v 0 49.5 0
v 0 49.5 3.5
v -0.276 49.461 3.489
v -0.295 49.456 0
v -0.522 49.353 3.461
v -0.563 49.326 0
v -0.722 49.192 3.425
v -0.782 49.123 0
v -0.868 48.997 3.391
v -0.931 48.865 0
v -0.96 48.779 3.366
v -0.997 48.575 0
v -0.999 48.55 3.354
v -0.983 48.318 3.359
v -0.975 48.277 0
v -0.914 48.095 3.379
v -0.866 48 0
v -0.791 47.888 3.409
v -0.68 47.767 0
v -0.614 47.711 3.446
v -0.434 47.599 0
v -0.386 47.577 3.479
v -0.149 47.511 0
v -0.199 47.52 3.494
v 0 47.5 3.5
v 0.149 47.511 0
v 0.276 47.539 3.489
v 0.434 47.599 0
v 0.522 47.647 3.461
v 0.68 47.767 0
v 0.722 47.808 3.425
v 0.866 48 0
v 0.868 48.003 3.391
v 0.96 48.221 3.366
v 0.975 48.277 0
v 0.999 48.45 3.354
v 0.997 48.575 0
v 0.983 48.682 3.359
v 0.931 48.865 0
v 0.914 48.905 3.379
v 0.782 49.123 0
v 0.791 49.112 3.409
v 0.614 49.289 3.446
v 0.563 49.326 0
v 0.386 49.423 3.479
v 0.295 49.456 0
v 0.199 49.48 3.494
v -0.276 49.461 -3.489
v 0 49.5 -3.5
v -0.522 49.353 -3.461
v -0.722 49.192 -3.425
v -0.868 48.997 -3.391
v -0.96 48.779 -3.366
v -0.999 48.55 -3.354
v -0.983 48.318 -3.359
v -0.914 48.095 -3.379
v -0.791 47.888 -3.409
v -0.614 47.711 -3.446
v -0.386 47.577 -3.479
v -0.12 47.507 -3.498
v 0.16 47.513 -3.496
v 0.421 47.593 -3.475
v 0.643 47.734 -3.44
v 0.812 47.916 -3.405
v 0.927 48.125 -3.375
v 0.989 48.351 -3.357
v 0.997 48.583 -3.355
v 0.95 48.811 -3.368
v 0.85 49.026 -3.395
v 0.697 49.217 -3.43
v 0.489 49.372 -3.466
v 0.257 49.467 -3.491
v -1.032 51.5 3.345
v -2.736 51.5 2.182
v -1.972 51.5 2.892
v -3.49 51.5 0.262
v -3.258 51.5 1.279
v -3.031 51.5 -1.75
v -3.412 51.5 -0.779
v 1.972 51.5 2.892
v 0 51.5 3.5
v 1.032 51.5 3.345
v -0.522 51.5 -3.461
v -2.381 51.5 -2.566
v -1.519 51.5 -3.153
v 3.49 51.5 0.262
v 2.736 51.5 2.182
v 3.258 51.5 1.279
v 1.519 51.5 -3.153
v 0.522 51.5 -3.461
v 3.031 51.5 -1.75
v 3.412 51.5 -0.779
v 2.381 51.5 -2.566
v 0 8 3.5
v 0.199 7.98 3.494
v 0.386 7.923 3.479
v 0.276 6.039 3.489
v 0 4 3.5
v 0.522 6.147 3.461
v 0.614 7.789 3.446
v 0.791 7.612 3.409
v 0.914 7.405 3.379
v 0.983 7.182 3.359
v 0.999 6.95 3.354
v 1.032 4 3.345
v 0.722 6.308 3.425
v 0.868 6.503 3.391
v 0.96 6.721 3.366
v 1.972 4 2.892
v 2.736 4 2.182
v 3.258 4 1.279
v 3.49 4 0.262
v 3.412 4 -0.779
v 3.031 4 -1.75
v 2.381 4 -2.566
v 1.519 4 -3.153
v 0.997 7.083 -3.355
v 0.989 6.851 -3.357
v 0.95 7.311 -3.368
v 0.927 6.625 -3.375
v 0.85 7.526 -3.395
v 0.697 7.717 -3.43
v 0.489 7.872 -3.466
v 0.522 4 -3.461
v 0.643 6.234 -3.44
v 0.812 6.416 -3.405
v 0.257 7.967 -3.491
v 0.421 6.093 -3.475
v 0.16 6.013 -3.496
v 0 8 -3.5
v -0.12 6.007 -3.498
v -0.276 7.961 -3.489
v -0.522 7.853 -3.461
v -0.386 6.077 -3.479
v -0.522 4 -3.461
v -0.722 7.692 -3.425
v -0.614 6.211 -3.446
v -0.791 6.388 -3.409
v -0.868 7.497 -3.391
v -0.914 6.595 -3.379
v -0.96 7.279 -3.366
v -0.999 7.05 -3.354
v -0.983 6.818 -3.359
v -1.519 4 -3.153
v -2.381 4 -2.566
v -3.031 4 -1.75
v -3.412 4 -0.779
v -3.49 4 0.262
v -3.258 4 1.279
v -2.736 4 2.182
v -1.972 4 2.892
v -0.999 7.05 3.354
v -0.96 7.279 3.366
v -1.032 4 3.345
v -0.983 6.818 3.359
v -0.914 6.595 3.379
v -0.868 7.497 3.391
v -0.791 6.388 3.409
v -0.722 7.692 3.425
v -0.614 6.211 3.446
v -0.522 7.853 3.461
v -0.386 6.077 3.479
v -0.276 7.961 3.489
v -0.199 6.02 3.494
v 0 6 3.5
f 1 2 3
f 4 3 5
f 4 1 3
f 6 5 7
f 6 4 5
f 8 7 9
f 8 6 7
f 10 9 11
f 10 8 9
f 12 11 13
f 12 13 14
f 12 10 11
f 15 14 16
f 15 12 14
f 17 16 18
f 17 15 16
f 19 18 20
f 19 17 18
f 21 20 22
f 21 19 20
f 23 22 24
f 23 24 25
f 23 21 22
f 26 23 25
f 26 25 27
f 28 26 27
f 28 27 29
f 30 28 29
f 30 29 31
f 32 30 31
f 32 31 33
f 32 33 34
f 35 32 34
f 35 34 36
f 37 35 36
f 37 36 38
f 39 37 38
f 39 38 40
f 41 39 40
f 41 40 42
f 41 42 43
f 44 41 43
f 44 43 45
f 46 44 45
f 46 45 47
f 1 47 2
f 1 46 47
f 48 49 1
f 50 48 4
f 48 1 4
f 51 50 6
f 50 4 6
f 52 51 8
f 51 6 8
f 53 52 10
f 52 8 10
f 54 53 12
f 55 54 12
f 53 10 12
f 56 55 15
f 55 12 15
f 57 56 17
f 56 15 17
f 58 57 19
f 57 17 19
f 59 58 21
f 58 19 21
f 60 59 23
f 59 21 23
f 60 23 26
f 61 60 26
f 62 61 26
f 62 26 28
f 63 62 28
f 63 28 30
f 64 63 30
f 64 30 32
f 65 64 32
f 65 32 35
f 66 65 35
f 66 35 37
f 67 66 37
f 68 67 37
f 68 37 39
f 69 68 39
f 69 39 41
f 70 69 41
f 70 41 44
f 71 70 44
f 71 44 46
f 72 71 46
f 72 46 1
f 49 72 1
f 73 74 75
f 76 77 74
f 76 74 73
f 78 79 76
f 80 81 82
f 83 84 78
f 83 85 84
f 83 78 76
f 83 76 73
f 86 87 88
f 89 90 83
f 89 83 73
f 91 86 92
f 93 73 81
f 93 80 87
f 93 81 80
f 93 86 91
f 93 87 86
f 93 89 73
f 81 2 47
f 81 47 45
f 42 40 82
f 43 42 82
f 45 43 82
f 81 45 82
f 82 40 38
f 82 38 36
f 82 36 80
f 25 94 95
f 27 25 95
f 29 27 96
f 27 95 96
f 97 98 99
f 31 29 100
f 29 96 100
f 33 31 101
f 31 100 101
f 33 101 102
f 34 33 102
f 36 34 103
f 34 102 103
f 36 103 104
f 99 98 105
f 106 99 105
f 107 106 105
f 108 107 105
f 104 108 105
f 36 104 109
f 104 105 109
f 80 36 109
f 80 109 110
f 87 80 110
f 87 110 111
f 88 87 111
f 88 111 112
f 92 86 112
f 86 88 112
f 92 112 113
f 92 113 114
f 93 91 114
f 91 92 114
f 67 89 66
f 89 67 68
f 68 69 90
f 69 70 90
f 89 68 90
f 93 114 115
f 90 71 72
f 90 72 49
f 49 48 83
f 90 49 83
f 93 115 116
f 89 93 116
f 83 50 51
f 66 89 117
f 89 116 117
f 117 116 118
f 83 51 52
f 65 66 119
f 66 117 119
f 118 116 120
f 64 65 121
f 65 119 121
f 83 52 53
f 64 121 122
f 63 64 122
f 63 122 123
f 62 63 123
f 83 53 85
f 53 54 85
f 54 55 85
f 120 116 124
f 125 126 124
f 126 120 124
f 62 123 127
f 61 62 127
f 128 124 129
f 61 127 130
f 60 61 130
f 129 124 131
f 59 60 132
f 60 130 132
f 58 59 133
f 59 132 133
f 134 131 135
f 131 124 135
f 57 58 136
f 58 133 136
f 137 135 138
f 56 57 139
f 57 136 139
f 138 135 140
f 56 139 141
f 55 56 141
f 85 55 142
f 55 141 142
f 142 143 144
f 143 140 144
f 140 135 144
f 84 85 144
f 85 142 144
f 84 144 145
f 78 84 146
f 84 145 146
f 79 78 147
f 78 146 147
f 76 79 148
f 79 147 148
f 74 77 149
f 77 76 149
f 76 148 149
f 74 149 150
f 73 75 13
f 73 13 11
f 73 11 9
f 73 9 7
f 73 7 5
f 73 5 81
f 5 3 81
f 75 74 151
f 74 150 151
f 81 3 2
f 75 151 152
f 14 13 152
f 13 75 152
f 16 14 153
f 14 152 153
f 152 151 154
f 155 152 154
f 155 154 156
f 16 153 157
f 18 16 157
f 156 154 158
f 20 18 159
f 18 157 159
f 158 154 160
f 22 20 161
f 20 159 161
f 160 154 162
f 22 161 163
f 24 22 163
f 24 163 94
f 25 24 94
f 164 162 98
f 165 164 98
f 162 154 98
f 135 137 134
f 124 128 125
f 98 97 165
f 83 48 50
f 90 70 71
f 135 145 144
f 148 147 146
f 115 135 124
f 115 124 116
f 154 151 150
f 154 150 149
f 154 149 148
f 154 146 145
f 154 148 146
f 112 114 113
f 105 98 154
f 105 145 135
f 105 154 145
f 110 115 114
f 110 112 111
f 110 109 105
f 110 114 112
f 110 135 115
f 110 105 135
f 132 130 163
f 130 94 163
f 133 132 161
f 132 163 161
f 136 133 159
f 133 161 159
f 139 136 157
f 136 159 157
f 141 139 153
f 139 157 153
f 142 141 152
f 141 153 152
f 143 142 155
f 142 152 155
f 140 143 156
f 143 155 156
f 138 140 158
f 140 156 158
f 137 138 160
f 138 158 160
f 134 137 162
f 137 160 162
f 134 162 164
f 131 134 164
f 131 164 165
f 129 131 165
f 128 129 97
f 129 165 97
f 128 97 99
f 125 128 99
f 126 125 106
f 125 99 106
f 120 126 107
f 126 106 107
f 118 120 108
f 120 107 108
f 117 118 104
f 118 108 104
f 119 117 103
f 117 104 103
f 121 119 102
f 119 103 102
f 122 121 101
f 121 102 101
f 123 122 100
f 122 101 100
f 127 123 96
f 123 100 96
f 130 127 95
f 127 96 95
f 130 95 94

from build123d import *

# Parameters (mm, degrees)
SKETCH_1_R          = 3.5
EXTRUDE_1_DEPTH     = 54.5
SKETCH_2_R          = 1
CUT_EXTRUDE_2_DEPTH = 27.25
SKETCH_3_R          = 7.070877384
CUT_EXTRUDE_3_DEPTH = 3
SKETCH_4_R          = 6.045504862
CUT_EXTRUDE_4_DEPTH = 4


with BuildPart() as part:
    # Эскиз1 → Вытянуть1 (new body)
    with BuildSketch(Plane(origin=(0, 0, 0), x_dir=(1, 0, 0), z_dir=(0, 1, 0))):
        with Locations(Location((0, 0, 0), (0, 0, 270))):
            Circle(SKETCH_1_R)
    extrude(amount=EXTRUDE_1_DEPTH)

    # Эскиз2 → Вытянуть2 (cut, symmetric)
    with BuildSketch(Plane.XY):
        with Locations(Location((0, 48.5, 0), (0, 0, 89.99999997))):
            Circle(SKETCH_2_R)
        with Locations(Location((0, 7, 0), (0, 0, 89.99999997))):
            Circle(SKETCH_2_R)
    extrude(amount=CUT_EXTRUDE_2_DEPTH, both=True, mode=Mode.SUBTRACT)

    # Эскиз3 → Вытянуть3 (cut)
    with BuildSketch(Plane(origin=(0, 54.5, 0), x_dir=(1, 0, 0), z_dir=(0, 1, 0))):
        Circle(SKETCH_3_R)
    extrude(amount=-CUT_EXTRUDE_3_DEPTH, mode=Mode.SUBTRACT)

    # Эскиз4 → Вытянуть4 (cut)
    with BuildSketch(Plane.XZ):
        Circle(SKETCH_4_R)
    extrude(amount=-CUT_EXTRUDE_4_DEPTH, mode=Mode.SUBTRACT)


solid = part.part
